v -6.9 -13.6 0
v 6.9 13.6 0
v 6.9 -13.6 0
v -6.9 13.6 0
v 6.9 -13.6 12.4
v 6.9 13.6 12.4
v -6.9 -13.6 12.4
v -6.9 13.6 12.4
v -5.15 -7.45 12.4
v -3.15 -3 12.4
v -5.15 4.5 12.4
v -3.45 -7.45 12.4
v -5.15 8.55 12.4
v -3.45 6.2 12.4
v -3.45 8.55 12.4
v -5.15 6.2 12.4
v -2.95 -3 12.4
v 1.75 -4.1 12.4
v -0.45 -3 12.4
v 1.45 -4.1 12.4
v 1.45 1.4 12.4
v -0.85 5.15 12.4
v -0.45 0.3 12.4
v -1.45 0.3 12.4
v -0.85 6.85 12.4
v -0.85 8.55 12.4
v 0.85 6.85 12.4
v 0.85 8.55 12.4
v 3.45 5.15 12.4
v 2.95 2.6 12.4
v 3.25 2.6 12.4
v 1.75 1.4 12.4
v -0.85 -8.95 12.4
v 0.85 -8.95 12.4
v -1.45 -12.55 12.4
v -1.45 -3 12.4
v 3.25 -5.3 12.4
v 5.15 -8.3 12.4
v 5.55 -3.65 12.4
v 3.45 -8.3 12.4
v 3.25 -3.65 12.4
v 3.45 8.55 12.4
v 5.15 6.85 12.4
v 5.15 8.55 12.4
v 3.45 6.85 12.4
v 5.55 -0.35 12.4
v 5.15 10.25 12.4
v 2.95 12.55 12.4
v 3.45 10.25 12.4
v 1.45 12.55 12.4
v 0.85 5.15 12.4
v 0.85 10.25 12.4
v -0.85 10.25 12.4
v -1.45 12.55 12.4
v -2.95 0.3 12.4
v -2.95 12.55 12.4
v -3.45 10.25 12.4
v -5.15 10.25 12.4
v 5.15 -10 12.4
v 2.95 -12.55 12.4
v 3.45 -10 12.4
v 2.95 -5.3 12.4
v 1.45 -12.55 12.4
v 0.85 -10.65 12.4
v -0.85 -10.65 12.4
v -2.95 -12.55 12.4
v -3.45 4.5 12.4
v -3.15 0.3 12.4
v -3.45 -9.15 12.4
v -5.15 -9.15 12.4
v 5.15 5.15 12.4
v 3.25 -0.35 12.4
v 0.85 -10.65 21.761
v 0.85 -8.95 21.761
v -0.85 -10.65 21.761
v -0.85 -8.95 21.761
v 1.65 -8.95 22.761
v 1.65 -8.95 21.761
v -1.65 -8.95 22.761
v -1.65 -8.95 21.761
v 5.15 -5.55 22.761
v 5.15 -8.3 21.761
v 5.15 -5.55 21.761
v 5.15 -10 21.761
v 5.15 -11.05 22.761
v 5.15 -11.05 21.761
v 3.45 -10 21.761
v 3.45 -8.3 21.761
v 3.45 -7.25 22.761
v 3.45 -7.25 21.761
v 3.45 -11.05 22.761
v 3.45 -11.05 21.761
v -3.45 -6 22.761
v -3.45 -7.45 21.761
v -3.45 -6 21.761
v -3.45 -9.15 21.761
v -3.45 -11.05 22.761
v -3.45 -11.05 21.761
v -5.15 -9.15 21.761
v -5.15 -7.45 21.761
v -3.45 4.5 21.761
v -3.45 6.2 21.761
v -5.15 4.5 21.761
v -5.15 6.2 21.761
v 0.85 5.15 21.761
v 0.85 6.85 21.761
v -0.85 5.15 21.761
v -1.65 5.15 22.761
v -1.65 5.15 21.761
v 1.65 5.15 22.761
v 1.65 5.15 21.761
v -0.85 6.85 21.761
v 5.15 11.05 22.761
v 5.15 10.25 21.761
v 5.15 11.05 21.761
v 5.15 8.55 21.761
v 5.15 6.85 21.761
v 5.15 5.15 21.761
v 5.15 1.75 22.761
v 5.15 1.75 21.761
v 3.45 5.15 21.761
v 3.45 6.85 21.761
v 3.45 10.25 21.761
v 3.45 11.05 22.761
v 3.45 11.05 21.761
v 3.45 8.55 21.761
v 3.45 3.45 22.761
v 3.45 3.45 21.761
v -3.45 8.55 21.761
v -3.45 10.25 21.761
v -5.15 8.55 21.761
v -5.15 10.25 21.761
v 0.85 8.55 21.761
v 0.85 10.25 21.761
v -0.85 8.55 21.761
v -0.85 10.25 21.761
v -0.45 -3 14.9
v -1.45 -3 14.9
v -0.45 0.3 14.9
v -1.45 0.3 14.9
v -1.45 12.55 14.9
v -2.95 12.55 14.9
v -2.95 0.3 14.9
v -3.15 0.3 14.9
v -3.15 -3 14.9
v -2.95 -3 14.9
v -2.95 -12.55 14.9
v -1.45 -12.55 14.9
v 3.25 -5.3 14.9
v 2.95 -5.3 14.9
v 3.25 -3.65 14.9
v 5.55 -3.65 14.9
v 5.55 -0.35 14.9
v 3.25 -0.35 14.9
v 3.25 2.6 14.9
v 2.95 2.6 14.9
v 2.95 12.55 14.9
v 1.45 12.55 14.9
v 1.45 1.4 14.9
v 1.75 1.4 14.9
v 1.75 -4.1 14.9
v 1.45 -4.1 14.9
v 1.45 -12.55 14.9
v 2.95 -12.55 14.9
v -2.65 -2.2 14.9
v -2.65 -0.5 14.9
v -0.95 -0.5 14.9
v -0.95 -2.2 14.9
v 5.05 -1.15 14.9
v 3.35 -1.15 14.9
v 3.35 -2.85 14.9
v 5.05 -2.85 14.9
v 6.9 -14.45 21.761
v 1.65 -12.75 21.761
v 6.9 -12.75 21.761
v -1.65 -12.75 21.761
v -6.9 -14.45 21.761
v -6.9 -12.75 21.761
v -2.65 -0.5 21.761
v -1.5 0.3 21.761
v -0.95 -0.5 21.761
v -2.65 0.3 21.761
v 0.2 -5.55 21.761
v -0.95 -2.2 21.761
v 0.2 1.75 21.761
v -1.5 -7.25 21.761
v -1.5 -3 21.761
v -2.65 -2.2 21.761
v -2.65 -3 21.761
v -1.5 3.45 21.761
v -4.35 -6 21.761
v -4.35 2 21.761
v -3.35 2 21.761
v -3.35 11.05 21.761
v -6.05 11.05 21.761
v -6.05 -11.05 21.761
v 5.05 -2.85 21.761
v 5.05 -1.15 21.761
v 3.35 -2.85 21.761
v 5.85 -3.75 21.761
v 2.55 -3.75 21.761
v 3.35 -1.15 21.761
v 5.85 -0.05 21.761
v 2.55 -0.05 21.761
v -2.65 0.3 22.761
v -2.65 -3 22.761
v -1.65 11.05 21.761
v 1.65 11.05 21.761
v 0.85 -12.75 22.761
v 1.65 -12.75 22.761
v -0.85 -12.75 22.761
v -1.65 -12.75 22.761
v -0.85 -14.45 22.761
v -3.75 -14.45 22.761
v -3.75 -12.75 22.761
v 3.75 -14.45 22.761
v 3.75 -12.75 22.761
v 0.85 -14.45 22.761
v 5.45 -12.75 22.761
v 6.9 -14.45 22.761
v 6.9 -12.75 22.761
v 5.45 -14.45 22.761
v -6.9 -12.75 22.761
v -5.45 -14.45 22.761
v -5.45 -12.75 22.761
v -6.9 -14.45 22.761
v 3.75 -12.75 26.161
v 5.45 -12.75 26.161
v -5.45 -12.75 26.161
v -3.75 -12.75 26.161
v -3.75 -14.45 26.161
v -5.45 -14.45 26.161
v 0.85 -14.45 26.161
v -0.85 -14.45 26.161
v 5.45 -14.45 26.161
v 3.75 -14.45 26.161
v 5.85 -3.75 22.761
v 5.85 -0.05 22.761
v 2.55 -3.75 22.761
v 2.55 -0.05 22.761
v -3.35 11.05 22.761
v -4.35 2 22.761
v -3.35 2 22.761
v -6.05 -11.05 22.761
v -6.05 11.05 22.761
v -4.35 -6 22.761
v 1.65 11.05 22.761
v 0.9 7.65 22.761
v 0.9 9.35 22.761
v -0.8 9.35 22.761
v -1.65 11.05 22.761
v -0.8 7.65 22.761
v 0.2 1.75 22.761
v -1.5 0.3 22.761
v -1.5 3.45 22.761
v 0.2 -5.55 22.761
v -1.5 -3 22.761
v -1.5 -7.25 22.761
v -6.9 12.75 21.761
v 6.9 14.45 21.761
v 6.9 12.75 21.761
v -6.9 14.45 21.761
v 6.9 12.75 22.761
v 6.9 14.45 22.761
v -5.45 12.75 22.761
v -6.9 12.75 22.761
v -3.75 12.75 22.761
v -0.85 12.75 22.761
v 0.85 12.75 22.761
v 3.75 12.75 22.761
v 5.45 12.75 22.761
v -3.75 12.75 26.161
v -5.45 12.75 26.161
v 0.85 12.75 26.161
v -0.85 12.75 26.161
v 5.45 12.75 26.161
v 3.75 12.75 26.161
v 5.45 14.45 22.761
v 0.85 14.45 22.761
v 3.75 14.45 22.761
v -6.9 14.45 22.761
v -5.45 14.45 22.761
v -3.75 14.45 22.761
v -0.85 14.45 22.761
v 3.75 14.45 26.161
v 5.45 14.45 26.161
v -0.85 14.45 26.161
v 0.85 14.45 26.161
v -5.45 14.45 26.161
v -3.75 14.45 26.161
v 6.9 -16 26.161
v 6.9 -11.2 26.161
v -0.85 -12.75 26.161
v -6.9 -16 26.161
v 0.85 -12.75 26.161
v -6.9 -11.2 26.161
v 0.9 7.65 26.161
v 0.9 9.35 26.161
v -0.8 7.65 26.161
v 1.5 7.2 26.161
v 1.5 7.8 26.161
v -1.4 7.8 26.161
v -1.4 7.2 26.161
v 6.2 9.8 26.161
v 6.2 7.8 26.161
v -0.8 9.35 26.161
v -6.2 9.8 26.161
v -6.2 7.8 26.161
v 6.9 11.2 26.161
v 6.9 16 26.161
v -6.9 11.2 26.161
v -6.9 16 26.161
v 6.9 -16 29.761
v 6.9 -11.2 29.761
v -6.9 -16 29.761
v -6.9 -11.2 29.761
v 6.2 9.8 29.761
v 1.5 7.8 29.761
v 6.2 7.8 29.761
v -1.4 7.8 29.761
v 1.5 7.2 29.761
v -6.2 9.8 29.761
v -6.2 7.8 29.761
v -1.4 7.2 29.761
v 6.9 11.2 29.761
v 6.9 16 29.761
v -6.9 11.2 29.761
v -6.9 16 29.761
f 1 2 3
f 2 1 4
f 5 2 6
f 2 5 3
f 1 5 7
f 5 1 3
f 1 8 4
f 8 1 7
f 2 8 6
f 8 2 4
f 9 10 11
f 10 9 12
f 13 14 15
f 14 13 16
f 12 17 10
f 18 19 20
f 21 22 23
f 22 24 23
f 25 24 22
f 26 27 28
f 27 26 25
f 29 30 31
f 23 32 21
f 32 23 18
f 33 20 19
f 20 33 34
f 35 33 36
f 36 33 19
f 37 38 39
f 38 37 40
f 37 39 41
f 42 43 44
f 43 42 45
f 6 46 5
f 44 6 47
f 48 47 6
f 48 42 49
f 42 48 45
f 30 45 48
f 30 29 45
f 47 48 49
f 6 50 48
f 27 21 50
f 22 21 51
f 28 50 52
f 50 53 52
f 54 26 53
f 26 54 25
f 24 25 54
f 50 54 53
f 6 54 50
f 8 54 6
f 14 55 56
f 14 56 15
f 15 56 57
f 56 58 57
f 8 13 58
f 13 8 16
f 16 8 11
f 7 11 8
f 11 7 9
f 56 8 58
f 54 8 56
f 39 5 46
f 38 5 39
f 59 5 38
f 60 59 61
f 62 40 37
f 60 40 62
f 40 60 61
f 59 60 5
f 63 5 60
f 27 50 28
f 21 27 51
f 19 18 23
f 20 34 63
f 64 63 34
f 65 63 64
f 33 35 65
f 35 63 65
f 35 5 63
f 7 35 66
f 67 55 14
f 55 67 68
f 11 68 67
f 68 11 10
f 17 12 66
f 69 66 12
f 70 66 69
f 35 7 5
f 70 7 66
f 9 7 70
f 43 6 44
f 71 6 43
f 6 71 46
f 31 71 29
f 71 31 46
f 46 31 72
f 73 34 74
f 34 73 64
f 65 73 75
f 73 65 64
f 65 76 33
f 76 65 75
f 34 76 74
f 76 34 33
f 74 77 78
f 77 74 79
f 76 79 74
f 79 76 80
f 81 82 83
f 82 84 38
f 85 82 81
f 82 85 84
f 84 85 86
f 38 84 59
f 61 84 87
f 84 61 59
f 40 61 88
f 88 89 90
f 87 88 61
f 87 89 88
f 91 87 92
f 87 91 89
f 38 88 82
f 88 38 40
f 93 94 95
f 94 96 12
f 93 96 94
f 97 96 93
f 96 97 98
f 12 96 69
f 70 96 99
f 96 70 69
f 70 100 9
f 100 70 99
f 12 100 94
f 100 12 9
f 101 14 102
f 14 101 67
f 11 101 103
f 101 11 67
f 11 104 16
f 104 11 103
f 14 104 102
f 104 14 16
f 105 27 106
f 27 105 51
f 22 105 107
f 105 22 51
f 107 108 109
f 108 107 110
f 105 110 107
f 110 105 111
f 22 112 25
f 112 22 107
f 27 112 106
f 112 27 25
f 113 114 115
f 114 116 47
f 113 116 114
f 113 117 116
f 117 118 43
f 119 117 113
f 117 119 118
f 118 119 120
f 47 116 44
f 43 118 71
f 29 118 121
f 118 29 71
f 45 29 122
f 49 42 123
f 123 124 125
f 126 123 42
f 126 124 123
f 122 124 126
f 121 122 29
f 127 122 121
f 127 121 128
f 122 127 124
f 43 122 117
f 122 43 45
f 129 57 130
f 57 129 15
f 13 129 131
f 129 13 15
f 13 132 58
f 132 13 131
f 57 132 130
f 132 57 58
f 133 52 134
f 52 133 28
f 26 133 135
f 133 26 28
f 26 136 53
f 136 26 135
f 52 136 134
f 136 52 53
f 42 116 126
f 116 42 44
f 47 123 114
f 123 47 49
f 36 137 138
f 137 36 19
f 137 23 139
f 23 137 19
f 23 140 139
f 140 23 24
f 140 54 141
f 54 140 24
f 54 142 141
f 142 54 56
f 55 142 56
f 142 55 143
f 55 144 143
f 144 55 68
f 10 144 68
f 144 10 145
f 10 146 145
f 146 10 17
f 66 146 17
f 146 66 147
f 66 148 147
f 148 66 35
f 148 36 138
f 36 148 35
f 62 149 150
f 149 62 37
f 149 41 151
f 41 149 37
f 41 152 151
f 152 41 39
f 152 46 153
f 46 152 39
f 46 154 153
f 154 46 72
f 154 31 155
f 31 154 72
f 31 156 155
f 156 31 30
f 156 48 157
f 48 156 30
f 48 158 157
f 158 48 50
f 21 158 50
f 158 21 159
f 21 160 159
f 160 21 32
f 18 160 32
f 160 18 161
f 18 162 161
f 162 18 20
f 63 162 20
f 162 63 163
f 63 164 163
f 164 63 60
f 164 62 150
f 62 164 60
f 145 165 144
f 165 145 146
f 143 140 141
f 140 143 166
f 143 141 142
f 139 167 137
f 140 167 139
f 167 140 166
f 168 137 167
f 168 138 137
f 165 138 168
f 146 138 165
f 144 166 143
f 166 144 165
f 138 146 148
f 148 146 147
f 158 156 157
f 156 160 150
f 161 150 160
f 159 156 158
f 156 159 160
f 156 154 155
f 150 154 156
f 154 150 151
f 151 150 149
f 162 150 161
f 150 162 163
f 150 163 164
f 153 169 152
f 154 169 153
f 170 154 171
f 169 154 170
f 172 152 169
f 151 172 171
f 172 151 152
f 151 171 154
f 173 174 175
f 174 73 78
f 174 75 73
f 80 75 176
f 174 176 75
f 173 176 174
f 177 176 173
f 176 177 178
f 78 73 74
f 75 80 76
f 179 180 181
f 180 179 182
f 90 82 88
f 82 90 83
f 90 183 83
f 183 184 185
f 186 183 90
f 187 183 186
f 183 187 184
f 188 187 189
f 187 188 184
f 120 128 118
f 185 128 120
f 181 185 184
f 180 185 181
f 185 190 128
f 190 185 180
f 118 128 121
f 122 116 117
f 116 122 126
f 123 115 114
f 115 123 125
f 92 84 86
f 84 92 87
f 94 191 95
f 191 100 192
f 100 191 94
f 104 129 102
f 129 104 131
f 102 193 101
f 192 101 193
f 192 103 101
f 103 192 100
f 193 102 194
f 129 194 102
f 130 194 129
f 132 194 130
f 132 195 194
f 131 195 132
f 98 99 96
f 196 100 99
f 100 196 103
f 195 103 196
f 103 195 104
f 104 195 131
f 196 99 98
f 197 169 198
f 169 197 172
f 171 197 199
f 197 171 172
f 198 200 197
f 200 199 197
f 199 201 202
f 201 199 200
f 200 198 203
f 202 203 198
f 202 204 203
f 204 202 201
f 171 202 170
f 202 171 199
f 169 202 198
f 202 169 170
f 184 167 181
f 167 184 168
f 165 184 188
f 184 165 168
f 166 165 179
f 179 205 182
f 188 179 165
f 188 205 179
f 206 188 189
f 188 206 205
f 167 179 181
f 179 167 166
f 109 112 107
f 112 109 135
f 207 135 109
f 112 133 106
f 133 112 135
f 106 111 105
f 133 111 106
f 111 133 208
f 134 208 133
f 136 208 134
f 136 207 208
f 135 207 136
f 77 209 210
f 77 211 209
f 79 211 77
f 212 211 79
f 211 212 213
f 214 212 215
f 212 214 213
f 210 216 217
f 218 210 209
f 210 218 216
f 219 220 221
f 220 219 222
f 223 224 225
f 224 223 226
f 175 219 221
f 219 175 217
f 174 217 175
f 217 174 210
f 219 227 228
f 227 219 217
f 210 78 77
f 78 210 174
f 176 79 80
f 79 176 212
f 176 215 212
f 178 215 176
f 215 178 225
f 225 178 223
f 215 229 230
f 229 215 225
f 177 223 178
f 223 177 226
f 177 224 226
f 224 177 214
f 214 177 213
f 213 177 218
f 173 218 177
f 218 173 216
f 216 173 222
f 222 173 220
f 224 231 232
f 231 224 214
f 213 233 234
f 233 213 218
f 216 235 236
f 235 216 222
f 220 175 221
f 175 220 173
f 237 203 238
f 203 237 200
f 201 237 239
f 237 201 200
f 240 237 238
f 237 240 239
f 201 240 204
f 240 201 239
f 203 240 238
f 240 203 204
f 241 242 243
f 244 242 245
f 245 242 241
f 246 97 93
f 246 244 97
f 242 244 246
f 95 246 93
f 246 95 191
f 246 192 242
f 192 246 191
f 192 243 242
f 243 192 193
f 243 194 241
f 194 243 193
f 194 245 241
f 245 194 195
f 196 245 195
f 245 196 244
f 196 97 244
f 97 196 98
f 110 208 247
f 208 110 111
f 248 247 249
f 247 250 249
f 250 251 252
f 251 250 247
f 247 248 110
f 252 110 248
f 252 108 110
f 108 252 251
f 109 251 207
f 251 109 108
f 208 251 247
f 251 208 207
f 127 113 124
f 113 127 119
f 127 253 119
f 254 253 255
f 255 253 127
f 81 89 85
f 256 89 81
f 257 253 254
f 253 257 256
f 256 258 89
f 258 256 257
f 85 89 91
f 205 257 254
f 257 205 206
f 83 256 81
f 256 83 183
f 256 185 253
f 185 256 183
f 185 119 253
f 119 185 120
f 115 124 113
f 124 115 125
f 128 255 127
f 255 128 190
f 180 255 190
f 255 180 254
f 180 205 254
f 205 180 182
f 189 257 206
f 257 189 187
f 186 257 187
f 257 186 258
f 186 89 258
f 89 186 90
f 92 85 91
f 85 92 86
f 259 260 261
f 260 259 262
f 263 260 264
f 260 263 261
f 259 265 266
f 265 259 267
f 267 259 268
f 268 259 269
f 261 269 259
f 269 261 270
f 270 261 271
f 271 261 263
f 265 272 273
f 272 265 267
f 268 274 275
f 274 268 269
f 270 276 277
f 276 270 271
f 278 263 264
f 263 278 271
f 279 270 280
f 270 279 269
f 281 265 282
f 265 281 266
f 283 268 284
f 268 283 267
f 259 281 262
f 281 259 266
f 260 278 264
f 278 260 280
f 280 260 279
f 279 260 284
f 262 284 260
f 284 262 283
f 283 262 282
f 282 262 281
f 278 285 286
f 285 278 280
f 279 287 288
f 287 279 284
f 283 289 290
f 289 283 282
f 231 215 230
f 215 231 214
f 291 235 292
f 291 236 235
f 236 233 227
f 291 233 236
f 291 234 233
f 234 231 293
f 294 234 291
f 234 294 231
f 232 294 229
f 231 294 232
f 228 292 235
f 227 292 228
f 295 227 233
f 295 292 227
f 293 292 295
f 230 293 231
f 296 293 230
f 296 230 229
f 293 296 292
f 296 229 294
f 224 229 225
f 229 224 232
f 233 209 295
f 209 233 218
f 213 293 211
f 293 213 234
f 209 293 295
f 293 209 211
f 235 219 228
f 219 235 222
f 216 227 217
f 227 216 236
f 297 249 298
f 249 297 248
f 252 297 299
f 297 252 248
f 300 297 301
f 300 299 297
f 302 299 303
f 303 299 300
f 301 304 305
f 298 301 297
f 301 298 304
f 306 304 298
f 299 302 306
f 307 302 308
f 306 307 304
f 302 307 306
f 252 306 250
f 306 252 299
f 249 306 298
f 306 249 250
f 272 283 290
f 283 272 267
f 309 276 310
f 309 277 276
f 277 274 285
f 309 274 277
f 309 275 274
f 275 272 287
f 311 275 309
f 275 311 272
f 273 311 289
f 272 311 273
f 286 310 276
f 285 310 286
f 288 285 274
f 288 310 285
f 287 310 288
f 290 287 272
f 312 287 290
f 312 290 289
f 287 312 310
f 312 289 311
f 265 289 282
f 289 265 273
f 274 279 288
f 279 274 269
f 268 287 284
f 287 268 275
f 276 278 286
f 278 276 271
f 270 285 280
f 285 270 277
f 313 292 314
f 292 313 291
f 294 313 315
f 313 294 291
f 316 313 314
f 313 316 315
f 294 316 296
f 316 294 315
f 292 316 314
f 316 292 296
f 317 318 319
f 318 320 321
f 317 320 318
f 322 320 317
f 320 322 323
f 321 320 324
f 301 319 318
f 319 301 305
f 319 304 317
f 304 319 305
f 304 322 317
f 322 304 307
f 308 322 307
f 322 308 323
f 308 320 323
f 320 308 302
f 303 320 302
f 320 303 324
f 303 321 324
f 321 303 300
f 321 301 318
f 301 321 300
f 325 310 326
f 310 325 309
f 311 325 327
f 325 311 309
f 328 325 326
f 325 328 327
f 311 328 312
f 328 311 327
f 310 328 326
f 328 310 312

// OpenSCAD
// Generated by SolidPython 0.4.2 on 2020-09-29 23:21:01
//!OpenSCAD

scale(v = 0.0100000000) {
	translate(v = [-690, -1360, 0]) {
		union() {
			color(c = [0.4000000000, 0.4000000000, 0.4000000000]) {
				translate(v = [0, 0, 0]) {
					linear_extrude(height = 1000.0000000000) {
						polygon(paths = [[0, 1, 2, 3]], points = [[0, 0], [0, 2720], [1380, 2720], [1380, 0]]);
					}
				}
			}
			color(c = [0.2000000000, 0.6000000000, 0.2000000000]) {
				translate(v = [0, 0, 1000.0000000000]) {
					linear_extrude(height = 120.0000000000) {
						polygon(paths = [[0, 1, 2, 3]], points = [[0, 1305], [0, 2720], [1380, 2720], [1380, 1305]]);
					}
				}
			}
			color(c = [0.4000000000, 0.4000000000, 0.4000000000]) {
				translate(v = [0, 0, 1000.0000000000]) {
					linear_extrude(height = 120.0000000000) {
						polygon(paths = [[0, 1, 2, 3]], points = [[0, 0], [0, 1305], [1380, 1305], [1380, 0]]);
					}
				}
			}
			color(c = [0.9000000000, 0.6000000000, 0.6000000000]) {
				translate(v = [0, 0, 1120.0000000000]) {
					linear_extrude(height = 120.0000000000) {
						polygon(paths = [[0, 1, 2, 3]], points = [[135, 1695], [135, 2485], [395, 2485], [395, 1695]]);
					}
				}
			}
			color(c = [0.9000000000, 0.6000000000, 0.6000000000]) {
				translate(v = [0, 0, 1120.0000000000]) {
					linear_extrude(height = 120.0000000000) {
						polygon(paths = [[0, 1, 2, 3]], points = [[545, 1695], [545, 2485], [835, 2485], [835, 1695]]);
					}
				}
			}
			color(c = [0.9000000000, 0.6000000000, 0.6000000000]) {
				translate(v = [0, 0, 1120.0000000000]) {
					linear_extrude(height = 120.0000000000) {
						polygon(paths = [[0, 1, 2, 3]], points = [[985, 1695], [985, 2485], [1245, 2485], [1245, 1695]]);
					}
				}
			}
			color(c = [0.9000000000, 0.6000000000, 0.9000000000]) {
				translate(v = [0, 0, 1120.0000000000]) {
					linear_extrude(height = 120.0000000000) {
						polygon(paths = [[0, 1, 2, 3]], points = [[135, 235], [135, 755], [395, 755], [395, 235]]);
					}
				}
			}
			color(c = [0.9000000000, 0.6000000000, 0.9000000000]) {
				translate(v = [0, 0, 1120.0000000000]) {
					linear_extrude(height = 120.0000000000) {
						polygon(paths = [[0, 1, 2, 3]], points = [[545, 235], [545, 755], [835, 755], [835, 235]]);
					}
				}
			}
			color(c = [0.9000000000, 0.6000000000, 0.9000000000]) {
				translate(v = [0, 0, 1120.0000000000]) {
					linear_extrude(height = 120.0000000000) {
						polygon(paths = [[0, 1, 2, 3]], points = [[985, 235], [985, 755], [1245, 755], [1245, 235]]);
					}
				}
			}
			color(c = [0.2000000000, 0.6000000000, 0.2000000000]) {
				translate(v = [0, 0, 1120.0000000000]) {
					linear_extrude(height = 120.0000000000) {
						difference() {
							polygon(paths = [[0, 1, 2, 3]], points = [[0, 1305], [0, 2720], [1380, 2720], [1380, 1305]]);
							polygon(paths = [[0, 1, 2, 3]], points = [[135, 1695], [395, 1695], [395, 2485], [135, 2485]]);
							polygon(paths = [[0, 1, 2, 3]], points = [[545, 1695], [835, 1695], [835, 2485], [545, 2485]]);
							polygon(paths = [[0, 1, 2, 3]], points = [[985, 1695], [1245, 1695], [1245, 2485], [985, 2485]]);
						}
					}
				}
			}
			color(c = [0.4000000000, 0.4000000000, 0.4000000000]) {
				translate(v = [0, 0, 1120.0000000000]) {
					linear_extrude(height = 120.0000000000) {
						difference() {
							polygon(paths = [[0, 1, 2, 3]], points = [[0, 0], [0, 1305], [1380, 1305], [1380, 0]]);
							polygon(paths = [[0, 1, 2, 3]], points = [[135, 235], [395, 235], [395, 755], [135, 755]]);
							polygon(paths = [[0, 1, 2, 3]], points = [[545, 235], [835, 235], [835, 755], [545, 755]]);
							polygon(paths = [[0, 1, 2, 3]], points = [[985, 235], [1245, 235], [1245, 755], [985, 755]]);
						}
					}
				}
			}
			color(c = [0.1000000000, 0.1000000000, 0.1000000000]) {
				translate(v = [0, 0, 1240.0000000000]) {
					linear_extrude(height = 70.0000000000) {
						polygon(paths = [[0, 1, 2, 3]], points = [[605, 295], [605, 465], [775, 465], [775, 295]]);
					}
				}
			}
			color(c = [0.1000000000, 0.1000000000, 0.1000000000]) {
				translate(v = [0, 0, 1240.0000000000]) {
					linear_extrude(height = 70.0000000000) {
						polygon(paths = [[0, 1, 2, 3]], points = [[1035, 360], [1035, 530], [1205, 530], [1205, 360]]);
					}
				}
			}
			color(c = [0.1000000000, 0.1000000000, 0.1000000000]) {
				translate(v = [0, 0, 1240.0000000000]) {
					linear_extrude(height = 70.0000000000) {
						polygon(paths = [[0, 1, 2, 3]], points = [[175, 445], [175, 615], [345, 615], [345, 445]]);
					}
				}
			}
			color(c = [0.1000000000, 0.1000000000, 0.1000000000]) {
				translate(v = [0, 0, 1240.0000000000]) {
					linear_extrude(height = 70.0000000000) {
						polygon(paths = [[0, 1, 2, 3]], points = [[175, 1810], [175, 1980], [345, 1980], [345, 1810]]);
					}
				}
			}
			color(c = [0.1000000000, 0.1000000000, 0.1000000000]) {
				translate(v = [0, 0, 1240.0000000000]) {
					linear_extrude(height = 70.0000000000) {
						polygon(paths = [[0, 1, 2, 3]], points = [[605, 1875], [605, 2045], [775, 2045], [775, 1875]]);
					}
				}
			}
			color(c = [0.1000000000, 0.1000000000, 0.1000000000]) {
				translate(v = [0, 0, 1240.0000000000]) {
					linear_extrude(height = 70.0000000000) {
						polygon(paths = [[0, 1, 2, 3]], points = [[1035, 1875], [1035, 2045], [1205, 2045], [1205, 1875]]);
					}
				}
			}
			color(c = [0.1000000000, 0.1000000000, 0.1000000000]) {
				translate(v = [0, 0, 1240.0000000000]) {
					linear_extrude(height = 70.0000000000) {
						polygon(paths = [[0, 1, 2, 3]], points = [[175, 2215], [175, 2385], [345, 2385], [345, 2215]]);
					}
				}
			}
			color(c = [0.1000000000, 0.1000000000, 0.1000000000]) {
				translate(v = [0, 0, 1240.0000000000]) {
					linear_extrude(height = 70.0000000000) {
						polygon(paths = [[0, 1, 2, 3]], points = [[605, 2215], [605, 2385], [775, 2385], [775, 2215]]);
					}
				}
			}
			color(c = [0.1000000000, 0.1000000000, 0.1000000000]) {
				translate(v = [0, 0, 1240.0000000000]) {
					linear_extrude(height = 70.0000000000) {
						polygon(paths = [[0, 1, 2, 3]], points = [[1035, 2215], [1035, 2385], [1205, 2385], [1205, 2215]]);
					}
				}
			}
			color(c = [1.0000000000, 1.0000000000, 1.0000000000]) {
				translate(v = [0, 0, 1240.0000000000]) {
					linear_extrude(height = 70.0000000000) {
						polygon(paths = [[0, 1, 2, 3, 4, 5, 6, 7, 8, 9, 10, 11]], points = [[395, 105], [395, 1060], [375, 1060], [375, 1390], [395, 1390], [395, 2615], [545, 2615], [545, 1390], [645, 1390], [645, 1060], [545, 1060], [545, 105]]);
					}
				}
			}
			color(c = [1.0000000000, 1.0000000000, 1.0000000000]) {
				translate(v = [0, 0, 1240.0000000000]) {
					linear_extrude(height = 70.0000000000) {
						polygon(paths = [[0, 1, 2, 3, 4, 5, 6, 7, 8, 9, 10, 11, 12, 13, 14, 15]], points = [[835, 105], [835, 950], [865, 950], [865, 1500], [835, 1500], [835, 2615], [985, 2615], [985, 1620], [1015, 1620], [1015, 1325], [1245, 1325], [1245, 995], [1015, 995], [1015, 830], [985, 830], [985, 105]]);
					}
				}
			}
			color(c = [0.1000000000, 0.1000000000, 0.1000000000]) {
				translate(v = [0, 0, 1310.0000000000]) {
					linear_extrude(height = 180.0000000000) {
						polygon(paths = [[0, 1, 2, 3]], points = [[605, 295], [605, 465], [775, 465], [775, 295]]);
					}
				}
			}
			color(c = [0.1000000000, 0.1000000000, 0.1000000000]) {
				translate(v = [0, 0, 1310.0000000000]) {
					linear_extrude(height = 180.0000000000) {
						polygon(paths = [[0, 1, 2, 3]], points = [[1035, 360], [1035, 530], [1205, 530], [1205, 360]]);
					}
				}
			}
			color(c = [0.1000000000, 0.1000000000, 0.1000000000]) {
				translate(v = [0, 0, 1310.0000000000]) {
					linear_extrude(height = 180.0000000000) {
						polygon(paths = [[0, 1, 2, 3]], points = [[175, 445], [175, 615], [345, 615], [345, 445]]);
					}
				}
			}
			color(c = [0.1000000000, 0.1000000000, 0.1000000000]) {
				translate(v = [0, 0, 1310.0000000000]) {
					linear_extrude(height = 180.0000000000) {
						polygon(paths = [[0, 1, 2, 3]], points = [[175, 1810], [175, 1980], [345, 1980], [345, 1810]]);
					}
				}
			}
			color(c = [0.1000000000, 0.1000000000, 0.1000000000]) {
				translate(v = [0, 0, 1310.0000000000]) {
					linear_extrude(height = 180.0000000000) {
						polygon(paths = [[0, 1, 2, 3]], points = [[605, 1875], [605, 2045], [775, 2045], [775, 1875]]);
					}
				}
			}
			color(c = [0.1000000000, 0.1000000000, 0.1000000000]) {
				translate(v = [0, 0, 1310.0000000000]) {
					linear_extrude(height = 180.0000000000) {
						polygon(paths = [[0, 1, 2, 3]], points = [[1035, 1875], [1035, 2045], [1205, 2045], [1205, 1875]]);
					}
				}
			}
			color(c = [0.1000000000, 0.1000000000, 0.1000000000]) {
				translate(v = [0, 0, 1310.0000000000]) {
					linear_extrude(height = 180.0000000000) {
						polygon(paths = [[0, 1, 2, 3]], points = [[175, 2215], [175, 2385], [345, 2385], [345, 2215]]);
					}
				}
			}
			color(c = [0.1000000000, 0.1000000000, 0.1000000000]) {
				translate(v = [0, 0, 1310.0000000000]) {
					linear_extrude(height = 180.0000000000) {
						polygon(paths = [[0, 1, 2, 3]], points = [[605, 2215], [605, 2385], [775, 2385], [775, 2215]]);
					}
				}
			}
			color(c = [0.1000000000, 0.1000000000, 0.1000000000]) {
				translate(v = [0, 0, 1310.0000000000]) {
					linear_extrude(height = 180.0000000000) {
						polygon(paths = [[0, 1, 2, 3]], points = [[1035, 2215], [1035, 2385], [1205, 2385], [1205, 2215]]);
					}
				}
			}
			color(c = [0.7000000000, 0, 0]) {
				translate(v = [0, 0, 1310.0000000000]) {
					linear_extrude(height = 180.0000000000) {
						polygon(paths = [[0, 1, 2, 3, 4, 5, 6, 7, 8, 9, 10, 11]], points = [[395, 105], [395, 1060], [375, 1060], [375, 1390], [395, 1390], [395, 2615], [545, 2615], [545, 1390], [645, 1390], [645, 1060], [545, 1060], [545, 105]]);
					}
				}
			}
			color(c = [0.7000000000, 0, 0]) {
				translate(v = [0, 0, 1310.0000000000]) {
					linear_extrude(height = 180.0000000000) {
						polygon(paths = [[0, 1, 2, 3, 4, 5, 6, 7, 8, 9, 10, 11, 12, 13, 14, 15]], points = [[835, 105], [835, 950], [865, 950], [865, 1500], [835, 1500], [835, 2615], [985, 2615], [985, 1620], [1015, 1620], [1015, 1325], [1245, 1325], [1245, 995], [1015, 995], [1015, 830], [985, 830], [985, 105]]);
					}
				}
			}
			color(c = [0.1000000000, 0.1000000000, 0.1000000000]) {
				translate(v = [0, 0, 1490.0000000000]) {
					linear_extrude(height = 686.1000000000) {
						polygon(paths = [[0, 1, 2, 3]], points = [[605, 295], [605, 465], [775, 465], [775, 295]]);
					}
				}
			}
			color(c = [0.1000000000, 0.1000000000, 0.1000000000]) {
				translate(v = [0, 0, 1490.0000000000]) {
					linear_extrude(height = 686.1000000000) {
						polygon(paths = [[0, 1, 2, 3]], points = [[1035, 360], [1035, 530], [1205, 530], [1205, 360]]);
					}
				}
			}
			color(c = [0.1000000000, 0.1000000000, 0.1000000000]) {
				translate(v = [0, 0, 1490.0000000000]) {
					linear_extrude(height = 686.1000000000) {
						polygon(paths = [[0, 1, 2, 3]], points = [[175, 445], [175, 615], [345, 615], [345, 445]]);
					}
				}
			}
			color(c = [0.1000000000, 0.1000000000, 0.1000000000]) {
				translate(v = [0, 0, 1490.0000000000]) {
					linear_extrude(height = 686.1000000000) {
						polygon(paths = [[0, 1, 2, 3]], points = [[1025, 1075], [1025, 1245], [1195, 1245], [1195, 1075]]);
					}
				}
			}
			color(c = [0.1000000000, 0.1000000000, 0.1000000000]) {
				translate(v = [0, 0, 1490.0000000000]) {
					linear_extrude(height = 686.1000000000) {
						polygon(paths = [[0, 1, 2, 3]], points = [[425, 1140], [425, 1310], [595, 1310], [595, 1140]]);
					}
				}
			}
			color(c = [0.1000000000, 0.1000000000, 0.1000000000]) {
				translate(v = [0, 0, 1490.0000000000]) {
					linear_extrude(height = 686.1000000000) {
						polygon(paths = [[0, 1, 2, 3]], points = [[175, 1810], [175, 1980], [345, 1980], [345, 1810]]);
					}
				}
			}
			color(c = [0.1000000000, 0.1000000000, 0.1000000000]) {
				translate(v = [0, 0, 1490.0000000000]) {
					linear_extrude(height = 686.1000000000) {
						polygon(paths = [[0, 1, 2, 3]], points = [[605, 1875], [605, 2045], [775, 2045], [775, 1875]]);
					}
				}
			}
			color(c = [0.1000000000, 0.1000000000, 0.1000000000]) {
				translate(v = [0, 0, 1490.0000000000]) {
					linear_extrude(height = 686.1000000000) {
						polygon(paths = [[0, 1, 2, 3]], points = [[1035, 1875], [1035, 2045], [1205, 2045], [1205, 1875]]);
					}
				}
			}
			color(c = [0.1000000000, 0.1000000000, 0.1000000000]) {
				translate(v = [0, 0, 1490.0000000000]) {
					linear_extrude(height = 686.1000000000) {
						polygon(paths = [[0, 1, 2, 3]], points = [[175, 2215], [175, 2385], [345, 2385], [345, 2215]]);
					}
				}
			}
			color(c = [0.1000000000, 0.1000000000, 0.1000000000]) {
				translate(v = [0, 0, 1490.0000000000]) {
					linear_extrude(height = 686.1000000000) {
						polygon(paths = [[0, 1, 2, 3]], points = [[605, 2215], [605, 2385], [775, 2385], [775, 2215]]);
					}
				}
			}
			color(c = [0.1000000000, 0.1000000000, 0.1000000000]) {
				translate(v = [0, 0, 1490.0000000000]) {
					linear_extrude(height = 686.1000000000) {
						polygon(paths = [[0, 1, 2, 3]], points = [[1035, 2215], [1035, 2385], [1205, 2385], [1205, 2215]]);
					}
				}
			}
			color(c = [0.9000000000, 0.6000000000, 0.6000000000]) {
				translate(v = [0, 0, 2176.1000000000]) {
					linear_extrude(height = 100.0000000000) {
						polygon(paths = [[0, 1, 2, 3, 4, 5, 6, 7]], points = [[0, -85], [0, 85], [525, 85], [525, 465], [855, 465], [855, 85], [1380, 85], [1380, -85]]);
					}
				}
			}
			color(c = [0.9000000000, 0.6000000000, 0.6000000000]) {
				translate(v = [0, 0, 2176.1000000000]) {
					linear_extrude(height = 100.0000000000) {
						polygon(paths = [[0, 1, 2, 3]], points = [[945, 985], [945, 1355], [1275, 1355], [1275, 985]]);
					}
				}
			}
			color(c = [0.9000000000, 0.6000000000, 0.6000000000]) {
				translate(v = [0, 0, 2176.1000000000]) {
					linear_extrude(height = 100.0000000000) {
						polygon(paths = [[0, 1, 2, 3, 4, 5, 6, 7]], points = [[85, 255], [85, 2465], [355, 2465], [355, 1560], [255, 1560], [255, 760], [345, 760], [345, 255]]);
					}
				}
			}
			color(c = [0.9000000000, 0.6000000000, 0.6000000000]) {
				translate(v = [0, 0, 2176.1000000000]) {
					linear_extrude(height = 100.0000000000) {
						polygon(paths = [[0, 1, 2, 3]], points = [[525, 1875], [525, 2465], [855, 2465], [855, 1875]]);
					}
				}
			}
			color(c = [0.9000000000, 0.6000000000, 0.6000000000]) {
				translate(v = [0, 0, 2176.1000000000]) {
					linear_extrude(height = 100.0000000000) {
						polygon(paths = [[0, 1, 2, 3, 4, 5, 6, 7, 8, 9, 10, 11, 12, 13, 14, 15]], points = [[1035, 255], [1035, 635], [540, 635], [540, 1060], [425, 1060], [425, 1390], [540, 1390], [540, 1705], [1035, 1705], [1035, 2465], [1205, 2465], [1205, 1535], [710, 1535], [710, 805], [1205, 805], [1205, 255]]);
					}
				}
			}
			color(c = [0.9000000000, 0.6000000000, 0.6000000000]) {
				translate(v = [0, 0, 2176.1000000000]) {
					linear_extrude(height = 100.0000000000) {
						polygon(paths = [[0, 1, 2, 3]], points = [[0, 2635], [0, 2805], [1380, 2805], [1380, 2635]]);
					}
				}
			}
			color(c = [0.5000000000, 0.5000000000, 0.5000000000]) {
				translate(v = [0, 0, 2276.1000000000]) {
					linear_extrude(height = 340.0000000000) {
						polygon(paths = [[0, 1, 2, 3]], points = [[145, -85], [145, 85], [315, 85], [315, -85]]);
					}
				}
			}
			color(c = [0.5000000000, 0.5000000000, 0.5000000000]) {
				translate(v = [0, 0, 2276.1000000000]) {
					linear_extrude(height = 340.0000000000) {
						polygon(paths = [[0, 1, 2, 3]], points = [[605, -85], [605, 85], [775, 85], [775, -85]]);
					}
				}
			}
			color(c = [0.5000000000, 0.5000000000, 0.5000000000]) {
				translate(v = [0, 0, 2276.1000000000]) {
					linear_extrude(height = 340.0000000000) {
						polygon(paths = [[0, 1, 2, 3]], points = [[1065, -85], [1065, 85], [1235, 85], [1235, -85]]);
					}
				}
			}
			color(c = [0.5000000000, 0.5000000000, 0.5000000000]) {
				translate(v = [0, 0, 2276.1000000000]) {
					linear_extrude(height = 340.0000000000) {
						polygon(paths = [[0, 1, 2, 3]], points = [[610, 2125], [610, 2295], [780, 2295], [780, 2125]]);
					}
				}
			}
			color(c = [0.5000000000, 0.5000000000, 0.5000000000]) {
				translate(v = [0, 0, 2276.1000000000]) {
					linear_extrude(height = 340.0000000000) {
						polygon(paths = [[0, 1, 2, 3]], points = [[145, 2635], [145, 2805], [315, 2805], [315, 2635]]);
					}
				}
			}
			color(c = [0.5000000000, 0.5000000000, 0.5000000000]) {
				translate(v = [0, 0, 2276.1000000000]) {
					linear_extrude(height = 340.0000000000) {
						polygon(paths = [[0, 1, 2, 3]], points = [[605, 2635], [605, 2805], [775, 2805], [775, 2635]]);
					}
				}
			}
			color(c = [0.5000000000, 0.5000000000, 0.5000000000]) {
				translate(v = [0, 0, 2276.1000000000]) {
					linear_extrude(height = 340.0000000000) {
						polygon(paths = [[0, 1, 2, 3]], points = [[1065, 2635], [1065, 2805], [1235, 2805], [1235, 2635]]);
					}
				}
			}
			color(c = [0.3000000000, 0.3000000000, 1]) {
				translate(v = [0, 0, 2616.1000000000]) {
					linear_extrude(height = 360.0000000000) {
						polygon(paths = [[0, 1, 2, 3]], points = [[0, -240], [0, 240], [1380, 240], [1380, -240]]);
					}
				}
			}
			color(c = [0.3000000000, 0.3000000000, 1]) {
				translate(v = [0, 0, 2616.1000000000]) {
					linear_extrude(height = 360.0000000000) {
						polygon(paths = [[0, 1, 2, 3, 4, 5, 6, 7]], points = [[550, 2080], [550, 2140], [70, 2140], [70, 2340], [1310, 2340], [1310, 2140], [840, 2140], [840, 2080]]);
					}
				}
			}
			color(c = [0.3000000000, 0.3000000000, 1]) {
				translate(v = [0, 0, 2616.1000000000]) {
					linear_extrude(height = 360.0000000000) {
						polygon(paths = [[0, 1, 2, 3]], points = [[0, 2480], [0, 2960], [1380, 2960], [1380, 2480]]);
					}
				}
			}
		}
	}
}
